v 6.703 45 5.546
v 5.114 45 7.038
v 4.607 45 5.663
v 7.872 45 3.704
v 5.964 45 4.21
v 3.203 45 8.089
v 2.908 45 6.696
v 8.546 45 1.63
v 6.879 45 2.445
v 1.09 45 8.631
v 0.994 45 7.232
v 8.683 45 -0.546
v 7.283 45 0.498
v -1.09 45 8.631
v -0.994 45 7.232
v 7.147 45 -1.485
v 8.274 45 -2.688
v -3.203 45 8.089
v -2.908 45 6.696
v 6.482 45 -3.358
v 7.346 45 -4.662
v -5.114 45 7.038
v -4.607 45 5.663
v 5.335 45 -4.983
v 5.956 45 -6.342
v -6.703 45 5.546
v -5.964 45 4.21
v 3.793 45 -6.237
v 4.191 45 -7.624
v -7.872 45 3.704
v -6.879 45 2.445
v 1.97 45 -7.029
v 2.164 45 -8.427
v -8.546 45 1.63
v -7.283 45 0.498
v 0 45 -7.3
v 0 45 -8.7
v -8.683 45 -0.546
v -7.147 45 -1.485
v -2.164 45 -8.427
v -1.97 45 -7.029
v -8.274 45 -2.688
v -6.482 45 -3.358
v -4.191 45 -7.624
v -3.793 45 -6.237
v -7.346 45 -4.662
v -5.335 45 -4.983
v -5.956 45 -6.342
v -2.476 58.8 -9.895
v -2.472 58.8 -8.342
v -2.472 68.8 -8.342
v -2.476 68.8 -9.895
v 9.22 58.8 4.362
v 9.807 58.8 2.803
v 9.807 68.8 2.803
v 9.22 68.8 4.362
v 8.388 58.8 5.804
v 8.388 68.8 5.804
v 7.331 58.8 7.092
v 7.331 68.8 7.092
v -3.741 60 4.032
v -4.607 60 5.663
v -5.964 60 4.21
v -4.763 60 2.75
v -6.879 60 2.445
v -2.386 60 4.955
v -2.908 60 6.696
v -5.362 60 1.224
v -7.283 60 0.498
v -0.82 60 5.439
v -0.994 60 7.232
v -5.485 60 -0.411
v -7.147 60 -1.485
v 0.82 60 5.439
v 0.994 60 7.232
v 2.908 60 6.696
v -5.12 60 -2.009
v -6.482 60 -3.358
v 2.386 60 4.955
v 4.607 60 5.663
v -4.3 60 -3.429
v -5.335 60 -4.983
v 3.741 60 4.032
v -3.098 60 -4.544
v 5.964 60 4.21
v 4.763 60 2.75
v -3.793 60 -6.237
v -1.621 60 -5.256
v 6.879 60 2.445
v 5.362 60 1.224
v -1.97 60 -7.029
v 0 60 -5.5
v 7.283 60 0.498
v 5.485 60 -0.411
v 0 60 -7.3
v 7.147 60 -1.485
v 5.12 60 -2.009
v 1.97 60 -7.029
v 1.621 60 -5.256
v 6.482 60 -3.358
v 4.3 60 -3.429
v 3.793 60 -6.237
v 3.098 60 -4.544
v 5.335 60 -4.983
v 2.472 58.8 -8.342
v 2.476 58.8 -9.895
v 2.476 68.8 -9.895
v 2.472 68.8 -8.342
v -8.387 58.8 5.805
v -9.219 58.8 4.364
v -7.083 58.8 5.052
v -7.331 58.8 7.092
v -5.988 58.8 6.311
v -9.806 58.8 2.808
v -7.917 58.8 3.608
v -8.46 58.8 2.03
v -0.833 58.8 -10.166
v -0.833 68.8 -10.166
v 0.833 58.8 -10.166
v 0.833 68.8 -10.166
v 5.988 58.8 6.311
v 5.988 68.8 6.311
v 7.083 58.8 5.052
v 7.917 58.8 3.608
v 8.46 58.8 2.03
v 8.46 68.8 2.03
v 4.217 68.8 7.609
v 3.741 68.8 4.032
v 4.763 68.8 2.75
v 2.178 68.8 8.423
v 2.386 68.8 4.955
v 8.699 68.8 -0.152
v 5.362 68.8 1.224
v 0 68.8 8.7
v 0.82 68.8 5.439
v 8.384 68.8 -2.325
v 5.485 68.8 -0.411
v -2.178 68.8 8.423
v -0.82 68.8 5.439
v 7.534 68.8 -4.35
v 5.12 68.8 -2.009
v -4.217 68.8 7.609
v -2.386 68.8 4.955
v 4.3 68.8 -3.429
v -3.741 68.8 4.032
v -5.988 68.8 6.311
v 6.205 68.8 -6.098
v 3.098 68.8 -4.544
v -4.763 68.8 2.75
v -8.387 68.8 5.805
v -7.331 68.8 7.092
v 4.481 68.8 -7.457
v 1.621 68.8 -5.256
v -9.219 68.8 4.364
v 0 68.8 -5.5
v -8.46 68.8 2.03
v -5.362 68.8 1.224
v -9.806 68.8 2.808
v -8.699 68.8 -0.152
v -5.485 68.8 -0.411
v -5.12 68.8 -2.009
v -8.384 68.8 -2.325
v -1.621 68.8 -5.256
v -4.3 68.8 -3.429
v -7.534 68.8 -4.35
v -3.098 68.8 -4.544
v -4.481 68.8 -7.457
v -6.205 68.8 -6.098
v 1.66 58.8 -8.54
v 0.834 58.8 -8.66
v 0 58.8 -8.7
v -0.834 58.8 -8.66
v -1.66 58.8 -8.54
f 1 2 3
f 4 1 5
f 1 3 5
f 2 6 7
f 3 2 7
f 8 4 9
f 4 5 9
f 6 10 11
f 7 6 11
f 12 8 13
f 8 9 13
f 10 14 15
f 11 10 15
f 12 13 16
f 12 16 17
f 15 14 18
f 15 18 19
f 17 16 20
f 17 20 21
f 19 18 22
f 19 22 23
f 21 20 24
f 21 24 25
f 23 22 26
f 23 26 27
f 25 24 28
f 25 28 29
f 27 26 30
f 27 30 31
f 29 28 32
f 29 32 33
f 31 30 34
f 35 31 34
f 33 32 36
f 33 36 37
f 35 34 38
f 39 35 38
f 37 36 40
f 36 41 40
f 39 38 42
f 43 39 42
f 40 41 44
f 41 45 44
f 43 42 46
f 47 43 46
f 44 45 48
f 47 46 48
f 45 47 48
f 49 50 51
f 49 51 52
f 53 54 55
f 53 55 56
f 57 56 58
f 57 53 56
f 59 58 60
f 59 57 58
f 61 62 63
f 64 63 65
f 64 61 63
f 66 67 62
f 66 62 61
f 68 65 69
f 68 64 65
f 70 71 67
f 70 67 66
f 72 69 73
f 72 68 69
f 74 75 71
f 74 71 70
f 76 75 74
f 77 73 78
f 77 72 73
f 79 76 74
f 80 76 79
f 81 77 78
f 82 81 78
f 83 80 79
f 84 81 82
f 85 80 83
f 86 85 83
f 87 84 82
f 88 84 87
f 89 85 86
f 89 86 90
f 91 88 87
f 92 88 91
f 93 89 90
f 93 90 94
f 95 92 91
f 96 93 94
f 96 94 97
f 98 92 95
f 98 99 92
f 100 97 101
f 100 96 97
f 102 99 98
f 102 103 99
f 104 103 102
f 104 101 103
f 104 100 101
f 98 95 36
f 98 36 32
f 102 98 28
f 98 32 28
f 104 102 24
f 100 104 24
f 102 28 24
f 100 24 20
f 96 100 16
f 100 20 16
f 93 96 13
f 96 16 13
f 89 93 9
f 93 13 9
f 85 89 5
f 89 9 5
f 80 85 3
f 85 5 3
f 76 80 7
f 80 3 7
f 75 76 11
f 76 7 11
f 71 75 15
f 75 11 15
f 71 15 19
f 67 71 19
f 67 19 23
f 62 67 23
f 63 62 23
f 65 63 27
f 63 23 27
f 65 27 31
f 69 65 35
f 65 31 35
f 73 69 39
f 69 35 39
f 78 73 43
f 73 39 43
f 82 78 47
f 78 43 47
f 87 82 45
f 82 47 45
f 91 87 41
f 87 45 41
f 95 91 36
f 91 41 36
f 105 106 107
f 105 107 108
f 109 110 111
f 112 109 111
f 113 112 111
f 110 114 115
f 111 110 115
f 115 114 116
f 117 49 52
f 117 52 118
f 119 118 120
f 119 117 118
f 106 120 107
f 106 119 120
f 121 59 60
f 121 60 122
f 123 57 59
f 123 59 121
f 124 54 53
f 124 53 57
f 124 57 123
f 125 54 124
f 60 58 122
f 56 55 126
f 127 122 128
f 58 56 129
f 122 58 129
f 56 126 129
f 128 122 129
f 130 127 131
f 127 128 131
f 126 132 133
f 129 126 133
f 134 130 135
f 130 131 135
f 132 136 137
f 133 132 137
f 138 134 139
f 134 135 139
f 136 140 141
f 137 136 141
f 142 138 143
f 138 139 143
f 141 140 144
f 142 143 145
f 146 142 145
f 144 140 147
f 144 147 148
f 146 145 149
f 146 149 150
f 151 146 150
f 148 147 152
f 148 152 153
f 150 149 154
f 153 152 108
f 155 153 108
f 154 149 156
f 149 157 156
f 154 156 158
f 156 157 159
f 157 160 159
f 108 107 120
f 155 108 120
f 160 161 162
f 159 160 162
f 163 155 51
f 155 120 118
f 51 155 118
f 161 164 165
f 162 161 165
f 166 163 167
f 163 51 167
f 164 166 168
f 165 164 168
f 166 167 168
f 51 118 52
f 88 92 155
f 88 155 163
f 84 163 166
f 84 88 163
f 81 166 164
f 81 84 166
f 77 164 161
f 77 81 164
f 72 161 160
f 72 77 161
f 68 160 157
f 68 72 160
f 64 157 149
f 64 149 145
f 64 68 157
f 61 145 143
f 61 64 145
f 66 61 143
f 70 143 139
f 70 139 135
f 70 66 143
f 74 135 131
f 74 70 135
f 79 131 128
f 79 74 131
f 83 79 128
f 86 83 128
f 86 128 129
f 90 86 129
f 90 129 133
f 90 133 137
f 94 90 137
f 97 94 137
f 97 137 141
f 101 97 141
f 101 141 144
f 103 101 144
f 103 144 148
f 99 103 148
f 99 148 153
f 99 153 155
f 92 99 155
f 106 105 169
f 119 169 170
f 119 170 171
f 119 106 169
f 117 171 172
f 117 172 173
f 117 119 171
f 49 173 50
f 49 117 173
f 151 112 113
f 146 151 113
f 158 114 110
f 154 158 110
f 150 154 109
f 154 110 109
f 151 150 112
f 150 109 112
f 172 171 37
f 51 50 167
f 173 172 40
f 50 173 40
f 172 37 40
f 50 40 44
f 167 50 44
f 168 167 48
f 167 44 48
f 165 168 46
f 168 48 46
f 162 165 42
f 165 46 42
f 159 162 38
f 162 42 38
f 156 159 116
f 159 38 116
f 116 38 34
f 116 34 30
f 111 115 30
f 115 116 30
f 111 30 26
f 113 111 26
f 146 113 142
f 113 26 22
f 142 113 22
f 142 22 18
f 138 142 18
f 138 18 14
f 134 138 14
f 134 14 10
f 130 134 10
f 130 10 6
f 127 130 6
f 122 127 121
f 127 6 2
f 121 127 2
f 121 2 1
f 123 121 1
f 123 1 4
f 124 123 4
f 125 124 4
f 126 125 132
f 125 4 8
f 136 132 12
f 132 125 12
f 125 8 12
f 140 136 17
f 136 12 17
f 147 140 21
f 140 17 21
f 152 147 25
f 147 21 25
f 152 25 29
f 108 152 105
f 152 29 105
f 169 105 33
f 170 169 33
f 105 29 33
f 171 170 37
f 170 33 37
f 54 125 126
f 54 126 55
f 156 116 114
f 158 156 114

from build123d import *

# Parameters (mm, degrees)
SKETCH1_R           = 8.7
SKETCH1_R_2         = 5.5
BOSS_EXTRUDE1_DEPTH = 68.8
BOSS_EXTRUDE2_START = 4
SKETCH2_R           = 16
SKETCH2_R_2         = 5.5
BOSS_EXTRUDE2_DEPTH = 4
FILLET1_R           = 2
FILLET2_R           = 1
BOSS_EXTRUDE6_START = -10
BOSS_EXTRUDE6_DEPTH = 10
CUT_EXTRUDE1_START  = -23
SKETCH10_R          = 8.7
SKETCH10_R_2        = 7.2
CUT_EXTRUDE1_DEPTH  = 23
SKETCH11_R          = 18.546055896
CUT_EXTRUDE2_DEPTH  = 54.972215104
SKETCH12_R          = 7.3
CUT_EXTRUDE3_DEPTH  = 15


with BuildPart() as part:
    # Sketch1 → Boss-Extrude1 (new body)
    with BuildSketch(Plane(origin=(0, 0, 0), x_dir=(1, 0, 0), z_dir=(0, 1, 0))):
        with Locations(Location((0, 0, 0), (0, 0, 90))):
            Circle(SKETCH1_R)
        with Locations(Location((0, 0, 0), (0, 0, 90))):
            Circle(SKETCH1_R_2, mode=Mode.SUBTRACT)
    extrude(amount=BOSS_EXTRUDE1_DEPTH)

    # Sketch2 → Boss-Extrude2 (add)
    with BuildSketch(Plane.XZ.offset(BOSS_EXTRUDE2_START)):
        with Locations(Location((0, 0, 0), (0, 0, 270))):
            Circle(SKETCH2_R)
        with Locations(Location((0, 0, 0), (0, 0, 270))):
            Circle(SKETCH2_R_2, mode=Mode.SUBTRACT)
    extrude(amount=-BOSS_EXTRUDE2_DEPTH)

    # Fillet1
    fillet1_edges = [part.edges().sort_by_distance(p)[0] for p in [
        (0, 0, 16),
        (0, -4, 16),
    ]]
    fillet(fillet1_edges, radius=FILLET1_R - 0.0001)  # a hair under: the kernel refuses the full size

    # Fillet2
    fillet2_edges = [part.edges().sort_by_distance(p)[0] for p in [
        (0, 0, 8.7),
    ]]
    fillet(fillet2_edges, radius=FILLET2_R)

    # Sketch7 → Boss-Extrude6 (add)
    with BuildSketch(Plane(origin=(0, 68.8, 0), x_dir=(1, 0, 0), z_dir=(0, 1, 0)).offset(BOSS_EXTRUDE6_START)):
        with BuildLine():
            Line((-8.459778344, -2.030307951), (-9.805994948, -2.807572454))
            ThreePointArc((-9.805994948, -2.807572454), (-8.832386986, -5.101856537), (-7.331446138, -7.091537035))
            Line((-7.331446138, -7.091537035), (-5.988187435, -6.311228981))
            ThreePointArc((-5.988187435, -6.311228981), (-7.534421013, -4.35), (-8.459778344, -2.030307951))
        make_face()
        with BuildLine():
            Line((-2.471590909, 8.341536931), (-2.475728155, 9.89498712))
            ThreePointArc((-2.475728155, 9.89498712), (0, 10.2), (2.475728155, 9.89498712))
            Line((2.475728155, 9.89498712), (2.471590909, 8.341536931))
            ThreePointArc((2.471590909, 8.341536931), (0, 8.7), (-2.471590909, 8.341536931))
        make_face()
        with BuildLine():
            Line((8.459778344, -2.030307951), (9.807174294, -2.803450085))
            ThreePointArc((9.807174294, -2.803450085), (8.833459119, -5.1), (7.331446138, -7.091537035))
            Line((7.331446138, -7.091537035), (5.988187435, -6.311228981))
            ThreePointArc((5.988187435, -6.311228981), (7.534421013, -4.35), (8.459778344, -2.030307951))
        make_face()
    extrude(amount=BOSS_EXTRUDE6_DEPTH)

    # Sketch10 → Cut-Extrude1 (cut)
    with BuildSketch(Plane(origin=(0, 45, 0), x_dir=(1, 0, 0), z_dir=(0, 1, 0)).offset(CUT_EXTRUDE1_START)):
        with Locations(Location((0, 0, 0), (0, 0, 90))):
            Circle(SKETCH10_R)
        with Locations(Location((0, 0, 0), (0, 0, 270))):
            Circle(SKETCH10_R_2, mode=Mode.SUBTRACT)
    extrude(amount=CUT_EXTRUDE1_DEPTH, mode=Mode.SUBTRACT)

    # Sketch11 → Cut-Extrude2 (cut, through all)
    with BuildSketch(Plane.XZ.offset(-45)):
        Circle(SKETCH11_R)
    extrude(amount=CUT_EXTRUDE2_DEPTH, mode=Mode.SUBTRACT)

    # Sketch12 → Cut-Extrude3 (cut)
    with BuildSketch(Plane.XZ.offset(-45)):
        with Locations(Location((0, 0, 0), (0, 0, 270))):
            Circle(SKETCH12_R)
    extrude(amount=-CUT_EXTRUDE3_DEPTH, mode=Mode.SUBTRACT)


solid = part.part
